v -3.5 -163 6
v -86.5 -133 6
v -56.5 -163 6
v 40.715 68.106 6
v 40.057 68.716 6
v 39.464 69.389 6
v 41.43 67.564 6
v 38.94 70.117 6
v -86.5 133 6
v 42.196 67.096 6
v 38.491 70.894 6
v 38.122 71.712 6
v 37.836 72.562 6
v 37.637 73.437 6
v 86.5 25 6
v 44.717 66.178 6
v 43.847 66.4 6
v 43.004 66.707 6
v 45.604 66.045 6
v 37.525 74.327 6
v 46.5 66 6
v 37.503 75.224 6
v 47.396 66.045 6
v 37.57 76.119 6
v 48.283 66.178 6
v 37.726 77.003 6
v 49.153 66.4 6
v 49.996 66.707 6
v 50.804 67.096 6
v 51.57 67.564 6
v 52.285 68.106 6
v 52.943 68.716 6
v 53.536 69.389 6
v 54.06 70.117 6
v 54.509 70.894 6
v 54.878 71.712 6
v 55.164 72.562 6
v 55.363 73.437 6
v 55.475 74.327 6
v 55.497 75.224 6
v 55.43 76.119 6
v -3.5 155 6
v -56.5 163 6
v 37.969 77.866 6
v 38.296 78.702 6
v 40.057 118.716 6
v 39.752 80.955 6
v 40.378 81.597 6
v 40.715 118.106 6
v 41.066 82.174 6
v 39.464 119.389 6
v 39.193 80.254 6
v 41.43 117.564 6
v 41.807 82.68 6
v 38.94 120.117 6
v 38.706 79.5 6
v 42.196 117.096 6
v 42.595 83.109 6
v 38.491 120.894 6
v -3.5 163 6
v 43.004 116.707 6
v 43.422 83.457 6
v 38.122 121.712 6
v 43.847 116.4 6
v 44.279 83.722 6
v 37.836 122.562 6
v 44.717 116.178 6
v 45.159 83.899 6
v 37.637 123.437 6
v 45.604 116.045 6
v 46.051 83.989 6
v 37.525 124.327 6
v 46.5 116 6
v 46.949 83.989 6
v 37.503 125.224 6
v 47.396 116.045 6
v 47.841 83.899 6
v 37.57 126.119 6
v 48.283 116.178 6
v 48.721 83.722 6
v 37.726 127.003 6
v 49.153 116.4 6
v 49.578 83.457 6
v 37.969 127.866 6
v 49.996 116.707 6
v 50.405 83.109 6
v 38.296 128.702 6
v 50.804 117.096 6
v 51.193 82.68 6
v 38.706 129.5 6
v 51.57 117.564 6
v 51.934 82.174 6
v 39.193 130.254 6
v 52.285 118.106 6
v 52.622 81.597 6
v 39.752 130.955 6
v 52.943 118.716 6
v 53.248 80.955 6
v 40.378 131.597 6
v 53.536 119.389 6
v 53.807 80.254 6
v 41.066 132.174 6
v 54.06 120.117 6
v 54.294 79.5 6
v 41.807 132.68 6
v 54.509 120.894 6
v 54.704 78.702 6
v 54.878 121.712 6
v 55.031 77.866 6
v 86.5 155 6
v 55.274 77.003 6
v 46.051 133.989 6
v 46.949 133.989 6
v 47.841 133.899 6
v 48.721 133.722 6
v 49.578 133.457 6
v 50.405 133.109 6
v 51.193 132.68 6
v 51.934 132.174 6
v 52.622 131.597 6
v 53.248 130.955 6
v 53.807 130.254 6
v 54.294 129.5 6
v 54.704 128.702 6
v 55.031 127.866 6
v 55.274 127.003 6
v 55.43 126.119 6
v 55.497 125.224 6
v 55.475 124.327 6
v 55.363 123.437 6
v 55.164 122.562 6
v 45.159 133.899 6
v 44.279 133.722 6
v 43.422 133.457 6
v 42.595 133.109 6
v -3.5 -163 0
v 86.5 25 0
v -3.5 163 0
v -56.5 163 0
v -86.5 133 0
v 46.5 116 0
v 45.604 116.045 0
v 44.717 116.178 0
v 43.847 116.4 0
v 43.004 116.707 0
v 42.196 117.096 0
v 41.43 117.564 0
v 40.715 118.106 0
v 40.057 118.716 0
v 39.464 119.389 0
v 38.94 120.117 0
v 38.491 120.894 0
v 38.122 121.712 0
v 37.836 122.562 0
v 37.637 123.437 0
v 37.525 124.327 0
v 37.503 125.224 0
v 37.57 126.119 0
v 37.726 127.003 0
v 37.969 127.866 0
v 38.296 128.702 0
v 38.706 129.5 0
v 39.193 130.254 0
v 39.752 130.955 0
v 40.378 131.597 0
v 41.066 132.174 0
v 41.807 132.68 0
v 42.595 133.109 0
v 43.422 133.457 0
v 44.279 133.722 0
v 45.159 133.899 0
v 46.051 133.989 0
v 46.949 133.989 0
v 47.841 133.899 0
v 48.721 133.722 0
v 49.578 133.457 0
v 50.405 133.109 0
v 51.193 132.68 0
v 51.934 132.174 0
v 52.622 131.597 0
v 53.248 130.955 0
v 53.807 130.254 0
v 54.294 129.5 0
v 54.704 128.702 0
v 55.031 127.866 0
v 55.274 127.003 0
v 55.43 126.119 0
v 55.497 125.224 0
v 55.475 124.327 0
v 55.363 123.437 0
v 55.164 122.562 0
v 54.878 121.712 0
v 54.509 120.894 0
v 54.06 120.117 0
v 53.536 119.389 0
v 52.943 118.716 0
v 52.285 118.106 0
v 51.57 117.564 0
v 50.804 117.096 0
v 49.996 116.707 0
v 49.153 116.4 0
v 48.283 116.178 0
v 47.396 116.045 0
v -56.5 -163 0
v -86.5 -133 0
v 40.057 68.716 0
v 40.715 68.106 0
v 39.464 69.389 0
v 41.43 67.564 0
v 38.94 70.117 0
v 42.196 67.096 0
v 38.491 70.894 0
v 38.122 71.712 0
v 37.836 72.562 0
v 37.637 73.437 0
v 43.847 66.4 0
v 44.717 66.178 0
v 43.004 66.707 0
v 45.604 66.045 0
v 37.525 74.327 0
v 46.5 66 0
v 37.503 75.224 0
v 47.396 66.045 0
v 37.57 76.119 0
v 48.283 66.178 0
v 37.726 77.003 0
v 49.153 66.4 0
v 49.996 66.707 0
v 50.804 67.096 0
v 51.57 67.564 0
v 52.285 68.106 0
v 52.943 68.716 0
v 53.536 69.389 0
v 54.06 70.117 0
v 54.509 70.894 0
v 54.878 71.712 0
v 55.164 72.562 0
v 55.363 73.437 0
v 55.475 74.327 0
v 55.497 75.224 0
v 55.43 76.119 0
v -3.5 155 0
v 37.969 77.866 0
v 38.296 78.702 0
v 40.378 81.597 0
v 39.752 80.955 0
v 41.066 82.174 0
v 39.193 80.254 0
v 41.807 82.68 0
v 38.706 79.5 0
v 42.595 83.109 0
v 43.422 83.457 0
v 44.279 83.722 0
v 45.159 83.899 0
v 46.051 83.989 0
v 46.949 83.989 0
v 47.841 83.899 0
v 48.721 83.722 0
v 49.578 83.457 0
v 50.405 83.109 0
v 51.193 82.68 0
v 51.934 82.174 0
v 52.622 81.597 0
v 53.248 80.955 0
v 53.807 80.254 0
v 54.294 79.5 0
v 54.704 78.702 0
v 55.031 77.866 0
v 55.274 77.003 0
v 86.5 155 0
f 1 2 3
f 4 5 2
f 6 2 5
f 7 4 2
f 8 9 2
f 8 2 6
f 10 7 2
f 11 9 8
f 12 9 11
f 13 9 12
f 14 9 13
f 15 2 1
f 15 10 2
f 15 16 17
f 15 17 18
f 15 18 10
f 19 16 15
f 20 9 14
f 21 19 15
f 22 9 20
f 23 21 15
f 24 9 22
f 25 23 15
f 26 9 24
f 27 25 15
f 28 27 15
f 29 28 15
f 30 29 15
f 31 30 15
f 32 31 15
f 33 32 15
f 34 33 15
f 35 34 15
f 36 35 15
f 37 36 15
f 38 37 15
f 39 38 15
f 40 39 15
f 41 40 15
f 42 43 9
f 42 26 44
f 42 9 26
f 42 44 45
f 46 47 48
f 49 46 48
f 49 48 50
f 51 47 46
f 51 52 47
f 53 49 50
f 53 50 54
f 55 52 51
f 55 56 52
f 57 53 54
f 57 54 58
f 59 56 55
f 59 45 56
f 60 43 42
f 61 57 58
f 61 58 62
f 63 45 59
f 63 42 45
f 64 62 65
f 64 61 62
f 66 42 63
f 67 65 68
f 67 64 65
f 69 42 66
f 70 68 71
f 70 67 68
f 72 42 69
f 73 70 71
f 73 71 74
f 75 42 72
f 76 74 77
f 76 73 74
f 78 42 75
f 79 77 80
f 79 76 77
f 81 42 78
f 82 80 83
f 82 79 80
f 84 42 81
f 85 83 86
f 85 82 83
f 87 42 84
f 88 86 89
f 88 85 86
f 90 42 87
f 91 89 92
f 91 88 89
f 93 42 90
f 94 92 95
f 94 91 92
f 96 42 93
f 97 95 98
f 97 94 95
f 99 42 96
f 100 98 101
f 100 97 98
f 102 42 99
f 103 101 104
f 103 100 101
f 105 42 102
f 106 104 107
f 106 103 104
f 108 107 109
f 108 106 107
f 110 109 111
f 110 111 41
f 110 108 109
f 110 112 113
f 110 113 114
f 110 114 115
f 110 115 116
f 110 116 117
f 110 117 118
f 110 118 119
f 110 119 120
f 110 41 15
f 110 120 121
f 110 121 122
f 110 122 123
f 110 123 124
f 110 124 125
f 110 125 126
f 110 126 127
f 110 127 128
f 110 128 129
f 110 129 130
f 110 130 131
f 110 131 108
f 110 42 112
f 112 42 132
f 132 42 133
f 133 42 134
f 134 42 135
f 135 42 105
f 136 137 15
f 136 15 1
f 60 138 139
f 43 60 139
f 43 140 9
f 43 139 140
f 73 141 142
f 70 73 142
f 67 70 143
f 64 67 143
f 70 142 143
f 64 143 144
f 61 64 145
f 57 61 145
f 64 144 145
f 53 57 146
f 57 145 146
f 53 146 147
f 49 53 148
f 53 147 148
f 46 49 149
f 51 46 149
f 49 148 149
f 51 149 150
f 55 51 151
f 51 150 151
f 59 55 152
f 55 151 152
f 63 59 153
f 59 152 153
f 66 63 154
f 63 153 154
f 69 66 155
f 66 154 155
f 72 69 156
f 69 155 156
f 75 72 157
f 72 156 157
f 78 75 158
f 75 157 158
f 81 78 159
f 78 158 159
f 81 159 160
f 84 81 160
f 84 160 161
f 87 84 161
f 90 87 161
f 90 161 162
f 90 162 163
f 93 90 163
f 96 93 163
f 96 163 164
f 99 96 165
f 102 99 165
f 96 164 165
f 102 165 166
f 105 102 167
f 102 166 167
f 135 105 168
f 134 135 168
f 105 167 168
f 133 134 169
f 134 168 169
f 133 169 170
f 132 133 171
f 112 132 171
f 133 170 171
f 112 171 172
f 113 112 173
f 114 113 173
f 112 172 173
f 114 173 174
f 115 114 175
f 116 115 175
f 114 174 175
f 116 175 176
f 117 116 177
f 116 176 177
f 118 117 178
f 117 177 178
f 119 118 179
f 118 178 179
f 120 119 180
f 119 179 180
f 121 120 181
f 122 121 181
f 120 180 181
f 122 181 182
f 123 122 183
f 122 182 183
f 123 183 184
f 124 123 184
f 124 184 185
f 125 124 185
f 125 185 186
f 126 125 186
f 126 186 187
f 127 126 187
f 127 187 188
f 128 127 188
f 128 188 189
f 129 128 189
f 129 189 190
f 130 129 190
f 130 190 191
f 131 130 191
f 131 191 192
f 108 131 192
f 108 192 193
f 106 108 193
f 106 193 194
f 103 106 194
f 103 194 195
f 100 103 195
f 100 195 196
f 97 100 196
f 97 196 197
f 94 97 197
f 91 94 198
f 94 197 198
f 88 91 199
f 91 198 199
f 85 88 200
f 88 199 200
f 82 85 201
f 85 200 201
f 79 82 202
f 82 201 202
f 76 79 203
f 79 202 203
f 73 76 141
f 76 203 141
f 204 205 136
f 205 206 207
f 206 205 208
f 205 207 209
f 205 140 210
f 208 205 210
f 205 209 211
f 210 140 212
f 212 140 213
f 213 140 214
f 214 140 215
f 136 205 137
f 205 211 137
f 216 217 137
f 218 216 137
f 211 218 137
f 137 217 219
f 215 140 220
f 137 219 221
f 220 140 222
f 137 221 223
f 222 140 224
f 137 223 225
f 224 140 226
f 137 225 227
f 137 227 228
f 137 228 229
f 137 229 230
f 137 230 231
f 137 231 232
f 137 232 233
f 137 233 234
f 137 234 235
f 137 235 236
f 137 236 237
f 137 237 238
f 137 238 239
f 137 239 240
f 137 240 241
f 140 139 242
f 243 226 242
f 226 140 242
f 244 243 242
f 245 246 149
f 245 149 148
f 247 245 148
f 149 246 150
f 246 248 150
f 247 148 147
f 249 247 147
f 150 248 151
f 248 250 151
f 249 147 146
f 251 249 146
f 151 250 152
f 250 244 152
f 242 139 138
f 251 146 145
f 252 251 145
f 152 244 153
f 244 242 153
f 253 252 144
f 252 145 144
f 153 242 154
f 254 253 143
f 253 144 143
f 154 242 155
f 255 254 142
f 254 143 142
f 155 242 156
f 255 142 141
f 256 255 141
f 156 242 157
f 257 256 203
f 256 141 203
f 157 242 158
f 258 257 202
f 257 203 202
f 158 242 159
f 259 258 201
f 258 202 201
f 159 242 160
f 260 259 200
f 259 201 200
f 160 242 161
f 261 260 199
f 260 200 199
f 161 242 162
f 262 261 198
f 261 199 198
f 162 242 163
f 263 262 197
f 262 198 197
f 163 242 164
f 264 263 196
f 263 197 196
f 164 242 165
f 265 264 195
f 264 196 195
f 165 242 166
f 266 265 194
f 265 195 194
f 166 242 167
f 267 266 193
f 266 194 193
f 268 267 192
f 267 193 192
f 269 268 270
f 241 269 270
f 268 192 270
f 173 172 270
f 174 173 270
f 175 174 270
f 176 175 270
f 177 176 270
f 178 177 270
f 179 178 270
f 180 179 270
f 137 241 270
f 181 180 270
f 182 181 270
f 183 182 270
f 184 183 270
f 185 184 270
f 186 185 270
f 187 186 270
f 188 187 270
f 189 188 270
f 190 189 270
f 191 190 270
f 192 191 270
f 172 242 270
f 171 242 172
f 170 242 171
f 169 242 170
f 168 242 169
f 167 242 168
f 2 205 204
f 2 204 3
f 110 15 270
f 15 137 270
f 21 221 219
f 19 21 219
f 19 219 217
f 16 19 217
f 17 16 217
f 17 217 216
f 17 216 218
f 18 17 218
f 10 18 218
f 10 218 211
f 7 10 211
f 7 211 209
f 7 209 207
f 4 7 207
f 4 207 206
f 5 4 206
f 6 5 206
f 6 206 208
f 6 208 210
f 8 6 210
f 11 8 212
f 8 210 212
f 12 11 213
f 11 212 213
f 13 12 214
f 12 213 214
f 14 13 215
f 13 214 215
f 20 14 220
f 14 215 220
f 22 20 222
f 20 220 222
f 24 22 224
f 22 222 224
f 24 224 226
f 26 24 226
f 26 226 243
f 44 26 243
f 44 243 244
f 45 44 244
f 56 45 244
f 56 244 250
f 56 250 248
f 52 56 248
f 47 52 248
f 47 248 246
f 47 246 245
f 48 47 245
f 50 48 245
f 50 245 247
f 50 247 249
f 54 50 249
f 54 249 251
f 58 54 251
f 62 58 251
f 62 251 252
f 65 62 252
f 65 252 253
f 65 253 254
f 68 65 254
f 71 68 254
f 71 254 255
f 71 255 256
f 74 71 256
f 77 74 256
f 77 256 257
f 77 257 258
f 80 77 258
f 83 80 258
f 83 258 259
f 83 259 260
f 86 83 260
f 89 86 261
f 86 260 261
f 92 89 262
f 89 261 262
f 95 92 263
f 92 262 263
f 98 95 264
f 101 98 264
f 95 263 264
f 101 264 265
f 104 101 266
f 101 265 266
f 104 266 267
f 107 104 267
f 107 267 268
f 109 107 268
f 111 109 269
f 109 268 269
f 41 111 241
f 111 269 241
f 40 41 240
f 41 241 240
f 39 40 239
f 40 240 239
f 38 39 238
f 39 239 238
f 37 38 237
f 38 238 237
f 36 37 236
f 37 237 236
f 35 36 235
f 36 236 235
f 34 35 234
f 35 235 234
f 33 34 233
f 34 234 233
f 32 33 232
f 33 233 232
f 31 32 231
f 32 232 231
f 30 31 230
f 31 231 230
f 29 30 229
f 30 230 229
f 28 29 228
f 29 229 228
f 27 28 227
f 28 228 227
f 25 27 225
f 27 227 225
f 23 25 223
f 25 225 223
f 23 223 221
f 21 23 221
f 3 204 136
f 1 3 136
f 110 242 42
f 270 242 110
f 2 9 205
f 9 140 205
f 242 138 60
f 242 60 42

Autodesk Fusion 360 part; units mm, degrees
sketch "スケッチ1" plane through (0, 0, 0) normal (0, 0, 1) x (1, 0, 0)
  line L0 (-3.5, 163) -> (-86.5, 163)
  line L1 (-86.5, 163) -> (-86.5, -163)
  line L2 (-86.5, -163) -> (-3.5, -163)
  line L3 (86.5, 25) -> (86.5, 155)
  line L4 (82.2546, 155) -> (-86.5, -163) construction
  line L5 (-86.5, 163) -> (39.184, -73.838) construction
  line L6 (-3.5, 163) -> (-3.5, 155)
  line L7 (-3.5, 155) -> (86.5, 155)
  line L8 (-86.5, -163) -> (-3.5, -163) construction
  line L9 (86.5, 25) -> (-3.5, -163)
  dimension "d2" = 326
  dimension "d5" = 83
extrude "押し出し1" add sketch "スケッチ1" along normal blind 6
chamfer "面取り1" distance 30 angle 45 2 edges at (-86.5, -163, 3) (-86.5, 163, 3)
sketch "スケッチ2" plane through (0, 0, 6) normal (0, 0, 1) x (-1, 0, 0)
  line L0 (56.5, -163) -> (86.5, -133)
  line L1 (86.5, -133) -> (86.5, 133)
  line L2 (86.5, 133) -> (56.5, 163)
  line L3 (56.5, 163) -> (3.5, 163)
  line L4 (3.5, 163) -> (-86.5, -25)
  line L5 (-86.5, -25) -> (-86.5, -155)
  line L6 (-86.5, -155) -> (3.5, -155)
  line L7 (3.5, -155) -> (3.5, -163)
  line L8 (3.5, -163) -> (56.5, -163)
  line L9 (-86.5, -155) -> (-46.5, -155) construction
  line L10 (-46.5, -155) -> (-46.5, -125) construction
  line L11 (-46.5, -125) -> (-86.5, -125) construction
  line L12 (-86.5, -125) -> (-86.5, -155) construction
  line L13 (-46.5, -125) -> (-46.5, -75) construction
  point P0 (-46.5, -125)
  point P1 (-46.5, -75)
  dimension "d10" = 40
  dimension "d11" = 30
  dimension "d12" = 50
hole "穴1" at (46.5, 125, 6) at (46.5, 75, 6) direction (0, 0, -1) diameter 18 end through all
equation "d5 = 30 mm + 53 mm"
